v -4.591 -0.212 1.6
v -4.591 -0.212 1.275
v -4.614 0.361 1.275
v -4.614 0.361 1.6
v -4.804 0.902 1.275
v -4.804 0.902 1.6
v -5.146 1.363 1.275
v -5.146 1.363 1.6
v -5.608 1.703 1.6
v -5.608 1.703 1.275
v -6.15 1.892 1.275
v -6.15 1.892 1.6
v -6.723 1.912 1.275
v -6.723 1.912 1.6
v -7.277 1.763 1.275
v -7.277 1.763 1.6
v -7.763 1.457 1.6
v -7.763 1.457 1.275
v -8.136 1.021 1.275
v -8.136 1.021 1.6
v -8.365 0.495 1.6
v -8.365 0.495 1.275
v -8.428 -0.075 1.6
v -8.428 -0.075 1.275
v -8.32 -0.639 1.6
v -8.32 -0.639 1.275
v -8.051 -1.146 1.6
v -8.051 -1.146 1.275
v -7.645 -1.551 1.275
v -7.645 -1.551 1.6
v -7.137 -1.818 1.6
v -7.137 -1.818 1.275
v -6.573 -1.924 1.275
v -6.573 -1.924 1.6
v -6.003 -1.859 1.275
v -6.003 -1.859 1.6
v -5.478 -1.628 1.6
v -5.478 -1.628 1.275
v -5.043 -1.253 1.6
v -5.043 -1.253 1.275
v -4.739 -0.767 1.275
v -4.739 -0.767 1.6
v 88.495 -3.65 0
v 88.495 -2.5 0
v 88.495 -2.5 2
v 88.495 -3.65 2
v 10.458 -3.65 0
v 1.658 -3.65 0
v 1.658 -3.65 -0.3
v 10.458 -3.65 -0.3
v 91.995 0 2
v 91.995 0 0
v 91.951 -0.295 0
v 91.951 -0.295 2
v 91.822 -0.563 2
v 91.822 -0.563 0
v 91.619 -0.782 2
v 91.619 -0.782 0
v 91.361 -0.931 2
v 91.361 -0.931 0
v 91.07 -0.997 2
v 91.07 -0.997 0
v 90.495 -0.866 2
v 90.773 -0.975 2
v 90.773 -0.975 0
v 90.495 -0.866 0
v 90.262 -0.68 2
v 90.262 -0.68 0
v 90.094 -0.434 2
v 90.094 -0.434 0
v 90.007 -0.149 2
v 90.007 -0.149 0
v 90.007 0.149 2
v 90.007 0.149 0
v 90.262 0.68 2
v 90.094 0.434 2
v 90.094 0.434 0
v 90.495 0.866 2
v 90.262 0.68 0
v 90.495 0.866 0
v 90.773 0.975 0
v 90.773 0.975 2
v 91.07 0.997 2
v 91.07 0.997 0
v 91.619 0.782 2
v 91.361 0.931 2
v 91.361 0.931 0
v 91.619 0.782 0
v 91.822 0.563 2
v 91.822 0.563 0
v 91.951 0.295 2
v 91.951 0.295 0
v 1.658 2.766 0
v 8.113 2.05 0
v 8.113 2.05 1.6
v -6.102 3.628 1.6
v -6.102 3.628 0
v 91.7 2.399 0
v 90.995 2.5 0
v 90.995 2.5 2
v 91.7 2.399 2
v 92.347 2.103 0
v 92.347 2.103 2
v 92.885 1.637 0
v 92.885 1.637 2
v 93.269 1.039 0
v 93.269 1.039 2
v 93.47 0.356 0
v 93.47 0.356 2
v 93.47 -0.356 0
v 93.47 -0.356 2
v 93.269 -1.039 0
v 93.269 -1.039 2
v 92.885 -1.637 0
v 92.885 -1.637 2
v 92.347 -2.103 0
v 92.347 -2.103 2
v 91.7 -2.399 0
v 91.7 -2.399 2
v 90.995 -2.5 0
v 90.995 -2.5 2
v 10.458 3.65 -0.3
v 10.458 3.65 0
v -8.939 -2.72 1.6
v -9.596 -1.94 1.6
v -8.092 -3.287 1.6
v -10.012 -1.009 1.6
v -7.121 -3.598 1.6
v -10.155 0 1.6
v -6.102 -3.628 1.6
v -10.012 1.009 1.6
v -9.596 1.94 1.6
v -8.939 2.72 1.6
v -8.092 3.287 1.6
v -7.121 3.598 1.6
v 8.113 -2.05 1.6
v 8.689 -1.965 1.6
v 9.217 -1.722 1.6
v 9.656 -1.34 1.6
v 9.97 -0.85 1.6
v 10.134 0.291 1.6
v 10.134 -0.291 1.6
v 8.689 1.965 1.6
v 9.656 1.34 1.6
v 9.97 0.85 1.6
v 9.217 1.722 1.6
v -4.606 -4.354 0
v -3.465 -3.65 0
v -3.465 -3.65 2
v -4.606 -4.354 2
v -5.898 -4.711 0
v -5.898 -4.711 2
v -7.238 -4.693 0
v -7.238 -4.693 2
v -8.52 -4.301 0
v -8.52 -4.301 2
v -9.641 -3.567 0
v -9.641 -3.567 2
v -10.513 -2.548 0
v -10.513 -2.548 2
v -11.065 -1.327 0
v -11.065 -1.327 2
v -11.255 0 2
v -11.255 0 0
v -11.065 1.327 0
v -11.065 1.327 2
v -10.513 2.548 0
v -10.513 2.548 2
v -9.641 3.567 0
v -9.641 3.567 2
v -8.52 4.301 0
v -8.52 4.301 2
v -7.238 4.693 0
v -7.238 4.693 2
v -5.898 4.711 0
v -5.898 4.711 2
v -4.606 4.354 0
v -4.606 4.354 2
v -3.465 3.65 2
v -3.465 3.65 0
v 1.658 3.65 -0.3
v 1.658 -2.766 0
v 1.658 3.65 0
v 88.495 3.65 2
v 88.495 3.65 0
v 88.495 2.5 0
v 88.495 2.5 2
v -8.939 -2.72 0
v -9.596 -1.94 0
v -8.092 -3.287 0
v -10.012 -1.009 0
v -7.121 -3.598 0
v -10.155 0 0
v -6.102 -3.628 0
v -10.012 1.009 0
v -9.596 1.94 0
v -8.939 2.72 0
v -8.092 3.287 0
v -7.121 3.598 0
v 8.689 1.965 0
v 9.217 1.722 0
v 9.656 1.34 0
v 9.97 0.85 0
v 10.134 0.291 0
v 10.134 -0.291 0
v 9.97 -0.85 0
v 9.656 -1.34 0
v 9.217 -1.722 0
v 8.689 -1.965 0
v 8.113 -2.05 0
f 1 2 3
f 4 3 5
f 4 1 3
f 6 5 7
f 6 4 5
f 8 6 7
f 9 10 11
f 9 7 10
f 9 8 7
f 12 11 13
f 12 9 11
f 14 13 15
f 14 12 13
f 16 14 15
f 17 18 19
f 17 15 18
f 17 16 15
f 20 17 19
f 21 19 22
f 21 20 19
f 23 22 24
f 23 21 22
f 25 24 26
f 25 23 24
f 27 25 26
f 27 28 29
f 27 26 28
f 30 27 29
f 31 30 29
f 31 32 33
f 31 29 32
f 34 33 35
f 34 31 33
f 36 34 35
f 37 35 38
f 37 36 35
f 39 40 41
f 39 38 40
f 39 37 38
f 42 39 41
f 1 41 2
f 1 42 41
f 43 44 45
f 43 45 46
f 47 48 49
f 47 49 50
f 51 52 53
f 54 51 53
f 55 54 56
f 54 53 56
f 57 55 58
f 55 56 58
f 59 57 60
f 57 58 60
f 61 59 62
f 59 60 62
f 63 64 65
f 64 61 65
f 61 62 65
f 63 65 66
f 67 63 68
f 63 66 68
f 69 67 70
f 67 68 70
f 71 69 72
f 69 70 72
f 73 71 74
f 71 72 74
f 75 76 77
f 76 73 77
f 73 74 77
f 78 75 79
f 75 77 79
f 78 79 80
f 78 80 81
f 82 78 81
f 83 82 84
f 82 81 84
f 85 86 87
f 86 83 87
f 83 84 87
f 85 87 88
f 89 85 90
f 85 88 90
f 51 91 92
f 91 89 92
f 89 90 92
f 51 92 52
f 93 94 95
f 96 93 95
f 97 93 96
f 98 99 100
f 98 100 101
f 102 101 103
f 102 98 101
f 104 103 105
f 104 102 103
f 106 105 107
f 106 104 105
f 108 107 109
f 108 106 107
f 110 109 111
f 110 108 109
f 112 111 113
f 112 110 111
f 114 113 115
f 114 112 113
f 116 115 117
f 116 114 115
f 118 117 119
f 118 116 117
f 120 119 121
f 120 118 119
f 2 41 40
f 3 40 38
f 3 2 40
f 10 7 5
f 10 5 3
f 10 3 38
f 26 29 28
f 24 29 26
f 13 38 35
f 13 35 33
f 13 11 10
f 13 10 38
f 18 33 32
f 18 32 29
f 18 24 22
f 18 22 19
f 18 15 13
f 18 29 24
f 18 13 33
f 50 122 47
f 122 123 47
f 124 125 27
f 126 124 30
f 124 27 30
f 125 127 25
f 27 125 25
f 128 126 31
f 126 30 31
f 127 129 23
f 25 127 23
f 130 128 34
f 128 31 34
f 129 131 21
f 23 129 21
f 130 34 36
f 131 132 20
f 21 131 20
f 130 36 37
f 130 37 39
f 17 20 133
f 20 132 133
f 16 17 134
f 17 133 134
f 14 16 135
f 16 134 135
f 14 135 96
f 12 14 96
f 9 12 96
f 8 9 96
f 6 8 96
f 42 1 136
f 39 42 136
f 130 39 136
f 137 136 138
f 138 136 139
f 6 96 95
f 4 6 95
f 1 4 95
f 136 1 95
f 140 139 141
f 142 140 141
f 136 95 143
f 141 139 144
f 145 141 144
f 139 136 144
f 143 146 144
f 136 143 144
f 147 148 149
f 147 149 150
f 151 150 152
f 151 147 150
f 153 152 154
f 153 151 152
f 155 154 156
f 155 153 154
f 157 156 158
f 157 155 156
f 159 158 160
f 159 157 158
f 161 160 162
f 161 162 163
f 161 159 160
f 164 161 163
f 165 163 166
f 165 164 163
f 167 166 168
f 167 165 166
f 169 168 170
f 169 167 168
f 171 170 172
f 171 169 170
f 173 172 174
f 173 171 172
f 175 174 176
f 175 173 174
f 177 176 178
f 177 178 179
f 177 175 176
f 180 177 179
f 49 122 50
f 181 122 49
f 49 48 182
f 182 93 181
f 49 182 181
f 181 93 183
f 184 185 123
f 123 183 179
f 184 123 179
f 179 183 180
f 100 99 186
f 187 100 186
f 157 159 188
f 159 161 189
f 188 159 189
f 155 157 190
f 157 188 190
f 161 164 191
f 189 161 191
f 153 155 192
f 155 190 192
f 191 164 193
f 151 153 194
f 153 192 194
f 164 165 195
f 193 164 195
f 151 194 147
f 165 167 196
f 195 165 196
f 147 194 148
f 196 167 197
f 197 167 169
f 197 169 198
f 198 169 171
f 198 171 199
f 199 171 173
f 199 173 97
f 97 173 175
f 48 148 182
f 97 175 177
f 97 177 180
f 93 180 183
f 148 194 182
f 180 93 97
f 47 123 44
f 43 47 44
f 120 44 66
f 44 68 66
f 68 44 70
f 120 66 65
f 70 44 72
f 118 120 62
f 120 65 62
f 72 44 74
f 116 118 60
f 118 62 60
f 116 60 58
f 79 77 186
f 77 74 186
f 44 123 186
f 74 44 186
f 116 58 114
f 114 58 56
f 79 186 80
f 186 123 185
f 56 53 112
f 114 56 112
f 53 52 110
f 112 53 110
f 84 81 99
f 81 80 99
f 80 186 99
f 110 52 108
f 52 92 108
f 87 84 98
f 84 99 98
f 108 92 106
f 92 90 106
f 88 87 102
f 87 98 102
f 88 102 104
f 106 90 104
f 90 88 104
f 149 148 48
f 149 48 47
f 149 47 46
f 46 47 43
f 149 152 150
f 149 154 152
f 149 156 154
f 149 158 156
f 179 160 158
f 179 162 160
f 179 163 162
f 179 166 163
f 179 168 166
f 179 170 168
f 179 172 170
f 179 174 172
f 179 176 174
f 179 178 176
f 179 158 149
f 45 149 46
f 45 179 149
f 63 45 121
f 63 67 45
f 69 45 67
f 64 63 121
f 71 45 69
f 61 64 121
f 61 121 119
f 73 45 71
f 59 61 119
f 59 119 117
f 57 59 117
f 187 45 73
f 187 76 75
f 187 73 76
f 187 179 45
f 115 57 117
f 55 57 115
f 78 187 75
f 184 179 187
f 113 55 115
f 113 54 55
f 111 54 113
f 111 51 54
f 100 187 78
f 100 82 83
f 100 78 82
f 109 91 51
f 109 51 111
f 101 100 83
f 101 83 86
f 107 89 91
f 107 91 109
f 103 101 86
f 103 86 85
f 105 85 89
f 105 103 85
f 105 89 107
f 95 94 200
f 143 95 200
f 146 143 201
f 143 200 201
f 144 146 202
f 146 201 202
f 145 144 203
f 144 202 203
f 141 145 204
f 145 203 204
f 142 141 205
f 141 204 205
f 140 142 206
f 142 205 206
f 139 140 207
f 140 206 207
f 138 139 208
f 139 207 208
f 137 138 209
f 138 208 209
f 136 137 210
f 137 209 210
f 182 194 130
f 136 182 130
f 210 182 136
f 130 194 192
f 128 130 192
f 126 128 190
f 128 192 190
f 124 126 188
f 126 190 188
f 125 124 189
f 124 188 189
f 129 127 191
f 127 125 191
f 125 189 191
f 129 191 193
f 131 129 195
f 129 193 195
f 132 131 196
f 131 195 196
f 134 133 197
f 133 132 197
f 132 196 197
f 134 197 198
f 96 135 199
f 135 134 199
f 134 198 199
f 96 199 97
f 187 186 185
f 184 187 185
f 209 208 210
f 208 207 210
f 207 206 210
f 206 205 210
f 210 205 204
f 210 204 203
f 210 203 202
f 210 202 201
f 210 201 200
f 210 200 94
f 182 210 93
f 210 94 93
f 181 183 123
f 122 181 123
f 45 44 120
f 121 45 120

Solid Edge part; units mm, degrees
sketch "Sketch1" plane through (0, 0, 0) normal (0, 0, 1) x (1, 0, 0)
  line L0 (-3.4648, -3.65) -> (88.4954, -3.65)
  line L1 (88.4954, -2.5) -> (88.4954, -3.65)
  line L2 (88.4954, -2.5) -> (90.9954, -2.5)
  line L3 (90.9954, 2.5) -> (88.4954, 2.5)
  line L4 (88.4954, 2.5) -> (88.4954, 3.65)
  line L5 (88.4954, 3.65) -> (-3.4648, 3.65)
  arc A0 (90.9954, 2.5) -> (90.9954, -2.5) centre (90.9954, 0) cw
  arc A1 (-3.4648, -3.65) -> (-3.4648, 3.65) centre (-6.5046, 0) cw
  circle A2 centre (90.9954, 0) radius 1
extrude "Protrusion1" add sketch "Sketch1" along normal blind 2
sketch "Sketch2" plane through (0, 0, 0) normal (0, 0, 1) x (1, 0, 0)
  arc A0 (8.113, -2.05) -> (8.113, 2.05) centre (8.1046, 0) ccw
  line L0 (8.113, 2.05) -> (-6.1019, 3.6277)
  arc A1 (-6.1019, 3.6277) -> (-6.1019, -3.6277) centre (-6.5046, 0) ccw
  line L1 (-6.1019, -3.6277) -> (8.113, -2.05)
extrude "Wycięcie_1" cut sketch "Sketch2" along normal blind 1.6
sketch "Sketch3" plane through (-0.55, 0, 1.6) normal (0, 0, -1) x (0.9939, -0.1103, 0)
  circle A0 centre (-5.9182, 0.6569) radius 1.925
extrude "Wyciągnięcie_2" add sketch "Sketch3" along normal mid plane 0.65
sketch "Sketch4" plane through (41.9756, 0, 0) normal (0, 0, -1) x (1, 0, 0)
  line L0 (-31.5172, 3.65) -> (-36.3172, 3.65)
  line L1 (-40.3172, 3.65) -> (-36.3172, 3.65)
  line L2 (-40.3172, 3.65) -> (-40.3172, -3.65)
  line L3 (-40.3172, -3.65) -> (-31.5172, -3.65)
  line L4 (-31.5172, -3.65) -> (-31.5172, 3.65)
extrude "Wyciągnięcie_4" add sketch "Sketch4" along normal blind 0.3
chamfer "Faza_3" [suppressed]
chamfer "Faza_2" [suppressed]
